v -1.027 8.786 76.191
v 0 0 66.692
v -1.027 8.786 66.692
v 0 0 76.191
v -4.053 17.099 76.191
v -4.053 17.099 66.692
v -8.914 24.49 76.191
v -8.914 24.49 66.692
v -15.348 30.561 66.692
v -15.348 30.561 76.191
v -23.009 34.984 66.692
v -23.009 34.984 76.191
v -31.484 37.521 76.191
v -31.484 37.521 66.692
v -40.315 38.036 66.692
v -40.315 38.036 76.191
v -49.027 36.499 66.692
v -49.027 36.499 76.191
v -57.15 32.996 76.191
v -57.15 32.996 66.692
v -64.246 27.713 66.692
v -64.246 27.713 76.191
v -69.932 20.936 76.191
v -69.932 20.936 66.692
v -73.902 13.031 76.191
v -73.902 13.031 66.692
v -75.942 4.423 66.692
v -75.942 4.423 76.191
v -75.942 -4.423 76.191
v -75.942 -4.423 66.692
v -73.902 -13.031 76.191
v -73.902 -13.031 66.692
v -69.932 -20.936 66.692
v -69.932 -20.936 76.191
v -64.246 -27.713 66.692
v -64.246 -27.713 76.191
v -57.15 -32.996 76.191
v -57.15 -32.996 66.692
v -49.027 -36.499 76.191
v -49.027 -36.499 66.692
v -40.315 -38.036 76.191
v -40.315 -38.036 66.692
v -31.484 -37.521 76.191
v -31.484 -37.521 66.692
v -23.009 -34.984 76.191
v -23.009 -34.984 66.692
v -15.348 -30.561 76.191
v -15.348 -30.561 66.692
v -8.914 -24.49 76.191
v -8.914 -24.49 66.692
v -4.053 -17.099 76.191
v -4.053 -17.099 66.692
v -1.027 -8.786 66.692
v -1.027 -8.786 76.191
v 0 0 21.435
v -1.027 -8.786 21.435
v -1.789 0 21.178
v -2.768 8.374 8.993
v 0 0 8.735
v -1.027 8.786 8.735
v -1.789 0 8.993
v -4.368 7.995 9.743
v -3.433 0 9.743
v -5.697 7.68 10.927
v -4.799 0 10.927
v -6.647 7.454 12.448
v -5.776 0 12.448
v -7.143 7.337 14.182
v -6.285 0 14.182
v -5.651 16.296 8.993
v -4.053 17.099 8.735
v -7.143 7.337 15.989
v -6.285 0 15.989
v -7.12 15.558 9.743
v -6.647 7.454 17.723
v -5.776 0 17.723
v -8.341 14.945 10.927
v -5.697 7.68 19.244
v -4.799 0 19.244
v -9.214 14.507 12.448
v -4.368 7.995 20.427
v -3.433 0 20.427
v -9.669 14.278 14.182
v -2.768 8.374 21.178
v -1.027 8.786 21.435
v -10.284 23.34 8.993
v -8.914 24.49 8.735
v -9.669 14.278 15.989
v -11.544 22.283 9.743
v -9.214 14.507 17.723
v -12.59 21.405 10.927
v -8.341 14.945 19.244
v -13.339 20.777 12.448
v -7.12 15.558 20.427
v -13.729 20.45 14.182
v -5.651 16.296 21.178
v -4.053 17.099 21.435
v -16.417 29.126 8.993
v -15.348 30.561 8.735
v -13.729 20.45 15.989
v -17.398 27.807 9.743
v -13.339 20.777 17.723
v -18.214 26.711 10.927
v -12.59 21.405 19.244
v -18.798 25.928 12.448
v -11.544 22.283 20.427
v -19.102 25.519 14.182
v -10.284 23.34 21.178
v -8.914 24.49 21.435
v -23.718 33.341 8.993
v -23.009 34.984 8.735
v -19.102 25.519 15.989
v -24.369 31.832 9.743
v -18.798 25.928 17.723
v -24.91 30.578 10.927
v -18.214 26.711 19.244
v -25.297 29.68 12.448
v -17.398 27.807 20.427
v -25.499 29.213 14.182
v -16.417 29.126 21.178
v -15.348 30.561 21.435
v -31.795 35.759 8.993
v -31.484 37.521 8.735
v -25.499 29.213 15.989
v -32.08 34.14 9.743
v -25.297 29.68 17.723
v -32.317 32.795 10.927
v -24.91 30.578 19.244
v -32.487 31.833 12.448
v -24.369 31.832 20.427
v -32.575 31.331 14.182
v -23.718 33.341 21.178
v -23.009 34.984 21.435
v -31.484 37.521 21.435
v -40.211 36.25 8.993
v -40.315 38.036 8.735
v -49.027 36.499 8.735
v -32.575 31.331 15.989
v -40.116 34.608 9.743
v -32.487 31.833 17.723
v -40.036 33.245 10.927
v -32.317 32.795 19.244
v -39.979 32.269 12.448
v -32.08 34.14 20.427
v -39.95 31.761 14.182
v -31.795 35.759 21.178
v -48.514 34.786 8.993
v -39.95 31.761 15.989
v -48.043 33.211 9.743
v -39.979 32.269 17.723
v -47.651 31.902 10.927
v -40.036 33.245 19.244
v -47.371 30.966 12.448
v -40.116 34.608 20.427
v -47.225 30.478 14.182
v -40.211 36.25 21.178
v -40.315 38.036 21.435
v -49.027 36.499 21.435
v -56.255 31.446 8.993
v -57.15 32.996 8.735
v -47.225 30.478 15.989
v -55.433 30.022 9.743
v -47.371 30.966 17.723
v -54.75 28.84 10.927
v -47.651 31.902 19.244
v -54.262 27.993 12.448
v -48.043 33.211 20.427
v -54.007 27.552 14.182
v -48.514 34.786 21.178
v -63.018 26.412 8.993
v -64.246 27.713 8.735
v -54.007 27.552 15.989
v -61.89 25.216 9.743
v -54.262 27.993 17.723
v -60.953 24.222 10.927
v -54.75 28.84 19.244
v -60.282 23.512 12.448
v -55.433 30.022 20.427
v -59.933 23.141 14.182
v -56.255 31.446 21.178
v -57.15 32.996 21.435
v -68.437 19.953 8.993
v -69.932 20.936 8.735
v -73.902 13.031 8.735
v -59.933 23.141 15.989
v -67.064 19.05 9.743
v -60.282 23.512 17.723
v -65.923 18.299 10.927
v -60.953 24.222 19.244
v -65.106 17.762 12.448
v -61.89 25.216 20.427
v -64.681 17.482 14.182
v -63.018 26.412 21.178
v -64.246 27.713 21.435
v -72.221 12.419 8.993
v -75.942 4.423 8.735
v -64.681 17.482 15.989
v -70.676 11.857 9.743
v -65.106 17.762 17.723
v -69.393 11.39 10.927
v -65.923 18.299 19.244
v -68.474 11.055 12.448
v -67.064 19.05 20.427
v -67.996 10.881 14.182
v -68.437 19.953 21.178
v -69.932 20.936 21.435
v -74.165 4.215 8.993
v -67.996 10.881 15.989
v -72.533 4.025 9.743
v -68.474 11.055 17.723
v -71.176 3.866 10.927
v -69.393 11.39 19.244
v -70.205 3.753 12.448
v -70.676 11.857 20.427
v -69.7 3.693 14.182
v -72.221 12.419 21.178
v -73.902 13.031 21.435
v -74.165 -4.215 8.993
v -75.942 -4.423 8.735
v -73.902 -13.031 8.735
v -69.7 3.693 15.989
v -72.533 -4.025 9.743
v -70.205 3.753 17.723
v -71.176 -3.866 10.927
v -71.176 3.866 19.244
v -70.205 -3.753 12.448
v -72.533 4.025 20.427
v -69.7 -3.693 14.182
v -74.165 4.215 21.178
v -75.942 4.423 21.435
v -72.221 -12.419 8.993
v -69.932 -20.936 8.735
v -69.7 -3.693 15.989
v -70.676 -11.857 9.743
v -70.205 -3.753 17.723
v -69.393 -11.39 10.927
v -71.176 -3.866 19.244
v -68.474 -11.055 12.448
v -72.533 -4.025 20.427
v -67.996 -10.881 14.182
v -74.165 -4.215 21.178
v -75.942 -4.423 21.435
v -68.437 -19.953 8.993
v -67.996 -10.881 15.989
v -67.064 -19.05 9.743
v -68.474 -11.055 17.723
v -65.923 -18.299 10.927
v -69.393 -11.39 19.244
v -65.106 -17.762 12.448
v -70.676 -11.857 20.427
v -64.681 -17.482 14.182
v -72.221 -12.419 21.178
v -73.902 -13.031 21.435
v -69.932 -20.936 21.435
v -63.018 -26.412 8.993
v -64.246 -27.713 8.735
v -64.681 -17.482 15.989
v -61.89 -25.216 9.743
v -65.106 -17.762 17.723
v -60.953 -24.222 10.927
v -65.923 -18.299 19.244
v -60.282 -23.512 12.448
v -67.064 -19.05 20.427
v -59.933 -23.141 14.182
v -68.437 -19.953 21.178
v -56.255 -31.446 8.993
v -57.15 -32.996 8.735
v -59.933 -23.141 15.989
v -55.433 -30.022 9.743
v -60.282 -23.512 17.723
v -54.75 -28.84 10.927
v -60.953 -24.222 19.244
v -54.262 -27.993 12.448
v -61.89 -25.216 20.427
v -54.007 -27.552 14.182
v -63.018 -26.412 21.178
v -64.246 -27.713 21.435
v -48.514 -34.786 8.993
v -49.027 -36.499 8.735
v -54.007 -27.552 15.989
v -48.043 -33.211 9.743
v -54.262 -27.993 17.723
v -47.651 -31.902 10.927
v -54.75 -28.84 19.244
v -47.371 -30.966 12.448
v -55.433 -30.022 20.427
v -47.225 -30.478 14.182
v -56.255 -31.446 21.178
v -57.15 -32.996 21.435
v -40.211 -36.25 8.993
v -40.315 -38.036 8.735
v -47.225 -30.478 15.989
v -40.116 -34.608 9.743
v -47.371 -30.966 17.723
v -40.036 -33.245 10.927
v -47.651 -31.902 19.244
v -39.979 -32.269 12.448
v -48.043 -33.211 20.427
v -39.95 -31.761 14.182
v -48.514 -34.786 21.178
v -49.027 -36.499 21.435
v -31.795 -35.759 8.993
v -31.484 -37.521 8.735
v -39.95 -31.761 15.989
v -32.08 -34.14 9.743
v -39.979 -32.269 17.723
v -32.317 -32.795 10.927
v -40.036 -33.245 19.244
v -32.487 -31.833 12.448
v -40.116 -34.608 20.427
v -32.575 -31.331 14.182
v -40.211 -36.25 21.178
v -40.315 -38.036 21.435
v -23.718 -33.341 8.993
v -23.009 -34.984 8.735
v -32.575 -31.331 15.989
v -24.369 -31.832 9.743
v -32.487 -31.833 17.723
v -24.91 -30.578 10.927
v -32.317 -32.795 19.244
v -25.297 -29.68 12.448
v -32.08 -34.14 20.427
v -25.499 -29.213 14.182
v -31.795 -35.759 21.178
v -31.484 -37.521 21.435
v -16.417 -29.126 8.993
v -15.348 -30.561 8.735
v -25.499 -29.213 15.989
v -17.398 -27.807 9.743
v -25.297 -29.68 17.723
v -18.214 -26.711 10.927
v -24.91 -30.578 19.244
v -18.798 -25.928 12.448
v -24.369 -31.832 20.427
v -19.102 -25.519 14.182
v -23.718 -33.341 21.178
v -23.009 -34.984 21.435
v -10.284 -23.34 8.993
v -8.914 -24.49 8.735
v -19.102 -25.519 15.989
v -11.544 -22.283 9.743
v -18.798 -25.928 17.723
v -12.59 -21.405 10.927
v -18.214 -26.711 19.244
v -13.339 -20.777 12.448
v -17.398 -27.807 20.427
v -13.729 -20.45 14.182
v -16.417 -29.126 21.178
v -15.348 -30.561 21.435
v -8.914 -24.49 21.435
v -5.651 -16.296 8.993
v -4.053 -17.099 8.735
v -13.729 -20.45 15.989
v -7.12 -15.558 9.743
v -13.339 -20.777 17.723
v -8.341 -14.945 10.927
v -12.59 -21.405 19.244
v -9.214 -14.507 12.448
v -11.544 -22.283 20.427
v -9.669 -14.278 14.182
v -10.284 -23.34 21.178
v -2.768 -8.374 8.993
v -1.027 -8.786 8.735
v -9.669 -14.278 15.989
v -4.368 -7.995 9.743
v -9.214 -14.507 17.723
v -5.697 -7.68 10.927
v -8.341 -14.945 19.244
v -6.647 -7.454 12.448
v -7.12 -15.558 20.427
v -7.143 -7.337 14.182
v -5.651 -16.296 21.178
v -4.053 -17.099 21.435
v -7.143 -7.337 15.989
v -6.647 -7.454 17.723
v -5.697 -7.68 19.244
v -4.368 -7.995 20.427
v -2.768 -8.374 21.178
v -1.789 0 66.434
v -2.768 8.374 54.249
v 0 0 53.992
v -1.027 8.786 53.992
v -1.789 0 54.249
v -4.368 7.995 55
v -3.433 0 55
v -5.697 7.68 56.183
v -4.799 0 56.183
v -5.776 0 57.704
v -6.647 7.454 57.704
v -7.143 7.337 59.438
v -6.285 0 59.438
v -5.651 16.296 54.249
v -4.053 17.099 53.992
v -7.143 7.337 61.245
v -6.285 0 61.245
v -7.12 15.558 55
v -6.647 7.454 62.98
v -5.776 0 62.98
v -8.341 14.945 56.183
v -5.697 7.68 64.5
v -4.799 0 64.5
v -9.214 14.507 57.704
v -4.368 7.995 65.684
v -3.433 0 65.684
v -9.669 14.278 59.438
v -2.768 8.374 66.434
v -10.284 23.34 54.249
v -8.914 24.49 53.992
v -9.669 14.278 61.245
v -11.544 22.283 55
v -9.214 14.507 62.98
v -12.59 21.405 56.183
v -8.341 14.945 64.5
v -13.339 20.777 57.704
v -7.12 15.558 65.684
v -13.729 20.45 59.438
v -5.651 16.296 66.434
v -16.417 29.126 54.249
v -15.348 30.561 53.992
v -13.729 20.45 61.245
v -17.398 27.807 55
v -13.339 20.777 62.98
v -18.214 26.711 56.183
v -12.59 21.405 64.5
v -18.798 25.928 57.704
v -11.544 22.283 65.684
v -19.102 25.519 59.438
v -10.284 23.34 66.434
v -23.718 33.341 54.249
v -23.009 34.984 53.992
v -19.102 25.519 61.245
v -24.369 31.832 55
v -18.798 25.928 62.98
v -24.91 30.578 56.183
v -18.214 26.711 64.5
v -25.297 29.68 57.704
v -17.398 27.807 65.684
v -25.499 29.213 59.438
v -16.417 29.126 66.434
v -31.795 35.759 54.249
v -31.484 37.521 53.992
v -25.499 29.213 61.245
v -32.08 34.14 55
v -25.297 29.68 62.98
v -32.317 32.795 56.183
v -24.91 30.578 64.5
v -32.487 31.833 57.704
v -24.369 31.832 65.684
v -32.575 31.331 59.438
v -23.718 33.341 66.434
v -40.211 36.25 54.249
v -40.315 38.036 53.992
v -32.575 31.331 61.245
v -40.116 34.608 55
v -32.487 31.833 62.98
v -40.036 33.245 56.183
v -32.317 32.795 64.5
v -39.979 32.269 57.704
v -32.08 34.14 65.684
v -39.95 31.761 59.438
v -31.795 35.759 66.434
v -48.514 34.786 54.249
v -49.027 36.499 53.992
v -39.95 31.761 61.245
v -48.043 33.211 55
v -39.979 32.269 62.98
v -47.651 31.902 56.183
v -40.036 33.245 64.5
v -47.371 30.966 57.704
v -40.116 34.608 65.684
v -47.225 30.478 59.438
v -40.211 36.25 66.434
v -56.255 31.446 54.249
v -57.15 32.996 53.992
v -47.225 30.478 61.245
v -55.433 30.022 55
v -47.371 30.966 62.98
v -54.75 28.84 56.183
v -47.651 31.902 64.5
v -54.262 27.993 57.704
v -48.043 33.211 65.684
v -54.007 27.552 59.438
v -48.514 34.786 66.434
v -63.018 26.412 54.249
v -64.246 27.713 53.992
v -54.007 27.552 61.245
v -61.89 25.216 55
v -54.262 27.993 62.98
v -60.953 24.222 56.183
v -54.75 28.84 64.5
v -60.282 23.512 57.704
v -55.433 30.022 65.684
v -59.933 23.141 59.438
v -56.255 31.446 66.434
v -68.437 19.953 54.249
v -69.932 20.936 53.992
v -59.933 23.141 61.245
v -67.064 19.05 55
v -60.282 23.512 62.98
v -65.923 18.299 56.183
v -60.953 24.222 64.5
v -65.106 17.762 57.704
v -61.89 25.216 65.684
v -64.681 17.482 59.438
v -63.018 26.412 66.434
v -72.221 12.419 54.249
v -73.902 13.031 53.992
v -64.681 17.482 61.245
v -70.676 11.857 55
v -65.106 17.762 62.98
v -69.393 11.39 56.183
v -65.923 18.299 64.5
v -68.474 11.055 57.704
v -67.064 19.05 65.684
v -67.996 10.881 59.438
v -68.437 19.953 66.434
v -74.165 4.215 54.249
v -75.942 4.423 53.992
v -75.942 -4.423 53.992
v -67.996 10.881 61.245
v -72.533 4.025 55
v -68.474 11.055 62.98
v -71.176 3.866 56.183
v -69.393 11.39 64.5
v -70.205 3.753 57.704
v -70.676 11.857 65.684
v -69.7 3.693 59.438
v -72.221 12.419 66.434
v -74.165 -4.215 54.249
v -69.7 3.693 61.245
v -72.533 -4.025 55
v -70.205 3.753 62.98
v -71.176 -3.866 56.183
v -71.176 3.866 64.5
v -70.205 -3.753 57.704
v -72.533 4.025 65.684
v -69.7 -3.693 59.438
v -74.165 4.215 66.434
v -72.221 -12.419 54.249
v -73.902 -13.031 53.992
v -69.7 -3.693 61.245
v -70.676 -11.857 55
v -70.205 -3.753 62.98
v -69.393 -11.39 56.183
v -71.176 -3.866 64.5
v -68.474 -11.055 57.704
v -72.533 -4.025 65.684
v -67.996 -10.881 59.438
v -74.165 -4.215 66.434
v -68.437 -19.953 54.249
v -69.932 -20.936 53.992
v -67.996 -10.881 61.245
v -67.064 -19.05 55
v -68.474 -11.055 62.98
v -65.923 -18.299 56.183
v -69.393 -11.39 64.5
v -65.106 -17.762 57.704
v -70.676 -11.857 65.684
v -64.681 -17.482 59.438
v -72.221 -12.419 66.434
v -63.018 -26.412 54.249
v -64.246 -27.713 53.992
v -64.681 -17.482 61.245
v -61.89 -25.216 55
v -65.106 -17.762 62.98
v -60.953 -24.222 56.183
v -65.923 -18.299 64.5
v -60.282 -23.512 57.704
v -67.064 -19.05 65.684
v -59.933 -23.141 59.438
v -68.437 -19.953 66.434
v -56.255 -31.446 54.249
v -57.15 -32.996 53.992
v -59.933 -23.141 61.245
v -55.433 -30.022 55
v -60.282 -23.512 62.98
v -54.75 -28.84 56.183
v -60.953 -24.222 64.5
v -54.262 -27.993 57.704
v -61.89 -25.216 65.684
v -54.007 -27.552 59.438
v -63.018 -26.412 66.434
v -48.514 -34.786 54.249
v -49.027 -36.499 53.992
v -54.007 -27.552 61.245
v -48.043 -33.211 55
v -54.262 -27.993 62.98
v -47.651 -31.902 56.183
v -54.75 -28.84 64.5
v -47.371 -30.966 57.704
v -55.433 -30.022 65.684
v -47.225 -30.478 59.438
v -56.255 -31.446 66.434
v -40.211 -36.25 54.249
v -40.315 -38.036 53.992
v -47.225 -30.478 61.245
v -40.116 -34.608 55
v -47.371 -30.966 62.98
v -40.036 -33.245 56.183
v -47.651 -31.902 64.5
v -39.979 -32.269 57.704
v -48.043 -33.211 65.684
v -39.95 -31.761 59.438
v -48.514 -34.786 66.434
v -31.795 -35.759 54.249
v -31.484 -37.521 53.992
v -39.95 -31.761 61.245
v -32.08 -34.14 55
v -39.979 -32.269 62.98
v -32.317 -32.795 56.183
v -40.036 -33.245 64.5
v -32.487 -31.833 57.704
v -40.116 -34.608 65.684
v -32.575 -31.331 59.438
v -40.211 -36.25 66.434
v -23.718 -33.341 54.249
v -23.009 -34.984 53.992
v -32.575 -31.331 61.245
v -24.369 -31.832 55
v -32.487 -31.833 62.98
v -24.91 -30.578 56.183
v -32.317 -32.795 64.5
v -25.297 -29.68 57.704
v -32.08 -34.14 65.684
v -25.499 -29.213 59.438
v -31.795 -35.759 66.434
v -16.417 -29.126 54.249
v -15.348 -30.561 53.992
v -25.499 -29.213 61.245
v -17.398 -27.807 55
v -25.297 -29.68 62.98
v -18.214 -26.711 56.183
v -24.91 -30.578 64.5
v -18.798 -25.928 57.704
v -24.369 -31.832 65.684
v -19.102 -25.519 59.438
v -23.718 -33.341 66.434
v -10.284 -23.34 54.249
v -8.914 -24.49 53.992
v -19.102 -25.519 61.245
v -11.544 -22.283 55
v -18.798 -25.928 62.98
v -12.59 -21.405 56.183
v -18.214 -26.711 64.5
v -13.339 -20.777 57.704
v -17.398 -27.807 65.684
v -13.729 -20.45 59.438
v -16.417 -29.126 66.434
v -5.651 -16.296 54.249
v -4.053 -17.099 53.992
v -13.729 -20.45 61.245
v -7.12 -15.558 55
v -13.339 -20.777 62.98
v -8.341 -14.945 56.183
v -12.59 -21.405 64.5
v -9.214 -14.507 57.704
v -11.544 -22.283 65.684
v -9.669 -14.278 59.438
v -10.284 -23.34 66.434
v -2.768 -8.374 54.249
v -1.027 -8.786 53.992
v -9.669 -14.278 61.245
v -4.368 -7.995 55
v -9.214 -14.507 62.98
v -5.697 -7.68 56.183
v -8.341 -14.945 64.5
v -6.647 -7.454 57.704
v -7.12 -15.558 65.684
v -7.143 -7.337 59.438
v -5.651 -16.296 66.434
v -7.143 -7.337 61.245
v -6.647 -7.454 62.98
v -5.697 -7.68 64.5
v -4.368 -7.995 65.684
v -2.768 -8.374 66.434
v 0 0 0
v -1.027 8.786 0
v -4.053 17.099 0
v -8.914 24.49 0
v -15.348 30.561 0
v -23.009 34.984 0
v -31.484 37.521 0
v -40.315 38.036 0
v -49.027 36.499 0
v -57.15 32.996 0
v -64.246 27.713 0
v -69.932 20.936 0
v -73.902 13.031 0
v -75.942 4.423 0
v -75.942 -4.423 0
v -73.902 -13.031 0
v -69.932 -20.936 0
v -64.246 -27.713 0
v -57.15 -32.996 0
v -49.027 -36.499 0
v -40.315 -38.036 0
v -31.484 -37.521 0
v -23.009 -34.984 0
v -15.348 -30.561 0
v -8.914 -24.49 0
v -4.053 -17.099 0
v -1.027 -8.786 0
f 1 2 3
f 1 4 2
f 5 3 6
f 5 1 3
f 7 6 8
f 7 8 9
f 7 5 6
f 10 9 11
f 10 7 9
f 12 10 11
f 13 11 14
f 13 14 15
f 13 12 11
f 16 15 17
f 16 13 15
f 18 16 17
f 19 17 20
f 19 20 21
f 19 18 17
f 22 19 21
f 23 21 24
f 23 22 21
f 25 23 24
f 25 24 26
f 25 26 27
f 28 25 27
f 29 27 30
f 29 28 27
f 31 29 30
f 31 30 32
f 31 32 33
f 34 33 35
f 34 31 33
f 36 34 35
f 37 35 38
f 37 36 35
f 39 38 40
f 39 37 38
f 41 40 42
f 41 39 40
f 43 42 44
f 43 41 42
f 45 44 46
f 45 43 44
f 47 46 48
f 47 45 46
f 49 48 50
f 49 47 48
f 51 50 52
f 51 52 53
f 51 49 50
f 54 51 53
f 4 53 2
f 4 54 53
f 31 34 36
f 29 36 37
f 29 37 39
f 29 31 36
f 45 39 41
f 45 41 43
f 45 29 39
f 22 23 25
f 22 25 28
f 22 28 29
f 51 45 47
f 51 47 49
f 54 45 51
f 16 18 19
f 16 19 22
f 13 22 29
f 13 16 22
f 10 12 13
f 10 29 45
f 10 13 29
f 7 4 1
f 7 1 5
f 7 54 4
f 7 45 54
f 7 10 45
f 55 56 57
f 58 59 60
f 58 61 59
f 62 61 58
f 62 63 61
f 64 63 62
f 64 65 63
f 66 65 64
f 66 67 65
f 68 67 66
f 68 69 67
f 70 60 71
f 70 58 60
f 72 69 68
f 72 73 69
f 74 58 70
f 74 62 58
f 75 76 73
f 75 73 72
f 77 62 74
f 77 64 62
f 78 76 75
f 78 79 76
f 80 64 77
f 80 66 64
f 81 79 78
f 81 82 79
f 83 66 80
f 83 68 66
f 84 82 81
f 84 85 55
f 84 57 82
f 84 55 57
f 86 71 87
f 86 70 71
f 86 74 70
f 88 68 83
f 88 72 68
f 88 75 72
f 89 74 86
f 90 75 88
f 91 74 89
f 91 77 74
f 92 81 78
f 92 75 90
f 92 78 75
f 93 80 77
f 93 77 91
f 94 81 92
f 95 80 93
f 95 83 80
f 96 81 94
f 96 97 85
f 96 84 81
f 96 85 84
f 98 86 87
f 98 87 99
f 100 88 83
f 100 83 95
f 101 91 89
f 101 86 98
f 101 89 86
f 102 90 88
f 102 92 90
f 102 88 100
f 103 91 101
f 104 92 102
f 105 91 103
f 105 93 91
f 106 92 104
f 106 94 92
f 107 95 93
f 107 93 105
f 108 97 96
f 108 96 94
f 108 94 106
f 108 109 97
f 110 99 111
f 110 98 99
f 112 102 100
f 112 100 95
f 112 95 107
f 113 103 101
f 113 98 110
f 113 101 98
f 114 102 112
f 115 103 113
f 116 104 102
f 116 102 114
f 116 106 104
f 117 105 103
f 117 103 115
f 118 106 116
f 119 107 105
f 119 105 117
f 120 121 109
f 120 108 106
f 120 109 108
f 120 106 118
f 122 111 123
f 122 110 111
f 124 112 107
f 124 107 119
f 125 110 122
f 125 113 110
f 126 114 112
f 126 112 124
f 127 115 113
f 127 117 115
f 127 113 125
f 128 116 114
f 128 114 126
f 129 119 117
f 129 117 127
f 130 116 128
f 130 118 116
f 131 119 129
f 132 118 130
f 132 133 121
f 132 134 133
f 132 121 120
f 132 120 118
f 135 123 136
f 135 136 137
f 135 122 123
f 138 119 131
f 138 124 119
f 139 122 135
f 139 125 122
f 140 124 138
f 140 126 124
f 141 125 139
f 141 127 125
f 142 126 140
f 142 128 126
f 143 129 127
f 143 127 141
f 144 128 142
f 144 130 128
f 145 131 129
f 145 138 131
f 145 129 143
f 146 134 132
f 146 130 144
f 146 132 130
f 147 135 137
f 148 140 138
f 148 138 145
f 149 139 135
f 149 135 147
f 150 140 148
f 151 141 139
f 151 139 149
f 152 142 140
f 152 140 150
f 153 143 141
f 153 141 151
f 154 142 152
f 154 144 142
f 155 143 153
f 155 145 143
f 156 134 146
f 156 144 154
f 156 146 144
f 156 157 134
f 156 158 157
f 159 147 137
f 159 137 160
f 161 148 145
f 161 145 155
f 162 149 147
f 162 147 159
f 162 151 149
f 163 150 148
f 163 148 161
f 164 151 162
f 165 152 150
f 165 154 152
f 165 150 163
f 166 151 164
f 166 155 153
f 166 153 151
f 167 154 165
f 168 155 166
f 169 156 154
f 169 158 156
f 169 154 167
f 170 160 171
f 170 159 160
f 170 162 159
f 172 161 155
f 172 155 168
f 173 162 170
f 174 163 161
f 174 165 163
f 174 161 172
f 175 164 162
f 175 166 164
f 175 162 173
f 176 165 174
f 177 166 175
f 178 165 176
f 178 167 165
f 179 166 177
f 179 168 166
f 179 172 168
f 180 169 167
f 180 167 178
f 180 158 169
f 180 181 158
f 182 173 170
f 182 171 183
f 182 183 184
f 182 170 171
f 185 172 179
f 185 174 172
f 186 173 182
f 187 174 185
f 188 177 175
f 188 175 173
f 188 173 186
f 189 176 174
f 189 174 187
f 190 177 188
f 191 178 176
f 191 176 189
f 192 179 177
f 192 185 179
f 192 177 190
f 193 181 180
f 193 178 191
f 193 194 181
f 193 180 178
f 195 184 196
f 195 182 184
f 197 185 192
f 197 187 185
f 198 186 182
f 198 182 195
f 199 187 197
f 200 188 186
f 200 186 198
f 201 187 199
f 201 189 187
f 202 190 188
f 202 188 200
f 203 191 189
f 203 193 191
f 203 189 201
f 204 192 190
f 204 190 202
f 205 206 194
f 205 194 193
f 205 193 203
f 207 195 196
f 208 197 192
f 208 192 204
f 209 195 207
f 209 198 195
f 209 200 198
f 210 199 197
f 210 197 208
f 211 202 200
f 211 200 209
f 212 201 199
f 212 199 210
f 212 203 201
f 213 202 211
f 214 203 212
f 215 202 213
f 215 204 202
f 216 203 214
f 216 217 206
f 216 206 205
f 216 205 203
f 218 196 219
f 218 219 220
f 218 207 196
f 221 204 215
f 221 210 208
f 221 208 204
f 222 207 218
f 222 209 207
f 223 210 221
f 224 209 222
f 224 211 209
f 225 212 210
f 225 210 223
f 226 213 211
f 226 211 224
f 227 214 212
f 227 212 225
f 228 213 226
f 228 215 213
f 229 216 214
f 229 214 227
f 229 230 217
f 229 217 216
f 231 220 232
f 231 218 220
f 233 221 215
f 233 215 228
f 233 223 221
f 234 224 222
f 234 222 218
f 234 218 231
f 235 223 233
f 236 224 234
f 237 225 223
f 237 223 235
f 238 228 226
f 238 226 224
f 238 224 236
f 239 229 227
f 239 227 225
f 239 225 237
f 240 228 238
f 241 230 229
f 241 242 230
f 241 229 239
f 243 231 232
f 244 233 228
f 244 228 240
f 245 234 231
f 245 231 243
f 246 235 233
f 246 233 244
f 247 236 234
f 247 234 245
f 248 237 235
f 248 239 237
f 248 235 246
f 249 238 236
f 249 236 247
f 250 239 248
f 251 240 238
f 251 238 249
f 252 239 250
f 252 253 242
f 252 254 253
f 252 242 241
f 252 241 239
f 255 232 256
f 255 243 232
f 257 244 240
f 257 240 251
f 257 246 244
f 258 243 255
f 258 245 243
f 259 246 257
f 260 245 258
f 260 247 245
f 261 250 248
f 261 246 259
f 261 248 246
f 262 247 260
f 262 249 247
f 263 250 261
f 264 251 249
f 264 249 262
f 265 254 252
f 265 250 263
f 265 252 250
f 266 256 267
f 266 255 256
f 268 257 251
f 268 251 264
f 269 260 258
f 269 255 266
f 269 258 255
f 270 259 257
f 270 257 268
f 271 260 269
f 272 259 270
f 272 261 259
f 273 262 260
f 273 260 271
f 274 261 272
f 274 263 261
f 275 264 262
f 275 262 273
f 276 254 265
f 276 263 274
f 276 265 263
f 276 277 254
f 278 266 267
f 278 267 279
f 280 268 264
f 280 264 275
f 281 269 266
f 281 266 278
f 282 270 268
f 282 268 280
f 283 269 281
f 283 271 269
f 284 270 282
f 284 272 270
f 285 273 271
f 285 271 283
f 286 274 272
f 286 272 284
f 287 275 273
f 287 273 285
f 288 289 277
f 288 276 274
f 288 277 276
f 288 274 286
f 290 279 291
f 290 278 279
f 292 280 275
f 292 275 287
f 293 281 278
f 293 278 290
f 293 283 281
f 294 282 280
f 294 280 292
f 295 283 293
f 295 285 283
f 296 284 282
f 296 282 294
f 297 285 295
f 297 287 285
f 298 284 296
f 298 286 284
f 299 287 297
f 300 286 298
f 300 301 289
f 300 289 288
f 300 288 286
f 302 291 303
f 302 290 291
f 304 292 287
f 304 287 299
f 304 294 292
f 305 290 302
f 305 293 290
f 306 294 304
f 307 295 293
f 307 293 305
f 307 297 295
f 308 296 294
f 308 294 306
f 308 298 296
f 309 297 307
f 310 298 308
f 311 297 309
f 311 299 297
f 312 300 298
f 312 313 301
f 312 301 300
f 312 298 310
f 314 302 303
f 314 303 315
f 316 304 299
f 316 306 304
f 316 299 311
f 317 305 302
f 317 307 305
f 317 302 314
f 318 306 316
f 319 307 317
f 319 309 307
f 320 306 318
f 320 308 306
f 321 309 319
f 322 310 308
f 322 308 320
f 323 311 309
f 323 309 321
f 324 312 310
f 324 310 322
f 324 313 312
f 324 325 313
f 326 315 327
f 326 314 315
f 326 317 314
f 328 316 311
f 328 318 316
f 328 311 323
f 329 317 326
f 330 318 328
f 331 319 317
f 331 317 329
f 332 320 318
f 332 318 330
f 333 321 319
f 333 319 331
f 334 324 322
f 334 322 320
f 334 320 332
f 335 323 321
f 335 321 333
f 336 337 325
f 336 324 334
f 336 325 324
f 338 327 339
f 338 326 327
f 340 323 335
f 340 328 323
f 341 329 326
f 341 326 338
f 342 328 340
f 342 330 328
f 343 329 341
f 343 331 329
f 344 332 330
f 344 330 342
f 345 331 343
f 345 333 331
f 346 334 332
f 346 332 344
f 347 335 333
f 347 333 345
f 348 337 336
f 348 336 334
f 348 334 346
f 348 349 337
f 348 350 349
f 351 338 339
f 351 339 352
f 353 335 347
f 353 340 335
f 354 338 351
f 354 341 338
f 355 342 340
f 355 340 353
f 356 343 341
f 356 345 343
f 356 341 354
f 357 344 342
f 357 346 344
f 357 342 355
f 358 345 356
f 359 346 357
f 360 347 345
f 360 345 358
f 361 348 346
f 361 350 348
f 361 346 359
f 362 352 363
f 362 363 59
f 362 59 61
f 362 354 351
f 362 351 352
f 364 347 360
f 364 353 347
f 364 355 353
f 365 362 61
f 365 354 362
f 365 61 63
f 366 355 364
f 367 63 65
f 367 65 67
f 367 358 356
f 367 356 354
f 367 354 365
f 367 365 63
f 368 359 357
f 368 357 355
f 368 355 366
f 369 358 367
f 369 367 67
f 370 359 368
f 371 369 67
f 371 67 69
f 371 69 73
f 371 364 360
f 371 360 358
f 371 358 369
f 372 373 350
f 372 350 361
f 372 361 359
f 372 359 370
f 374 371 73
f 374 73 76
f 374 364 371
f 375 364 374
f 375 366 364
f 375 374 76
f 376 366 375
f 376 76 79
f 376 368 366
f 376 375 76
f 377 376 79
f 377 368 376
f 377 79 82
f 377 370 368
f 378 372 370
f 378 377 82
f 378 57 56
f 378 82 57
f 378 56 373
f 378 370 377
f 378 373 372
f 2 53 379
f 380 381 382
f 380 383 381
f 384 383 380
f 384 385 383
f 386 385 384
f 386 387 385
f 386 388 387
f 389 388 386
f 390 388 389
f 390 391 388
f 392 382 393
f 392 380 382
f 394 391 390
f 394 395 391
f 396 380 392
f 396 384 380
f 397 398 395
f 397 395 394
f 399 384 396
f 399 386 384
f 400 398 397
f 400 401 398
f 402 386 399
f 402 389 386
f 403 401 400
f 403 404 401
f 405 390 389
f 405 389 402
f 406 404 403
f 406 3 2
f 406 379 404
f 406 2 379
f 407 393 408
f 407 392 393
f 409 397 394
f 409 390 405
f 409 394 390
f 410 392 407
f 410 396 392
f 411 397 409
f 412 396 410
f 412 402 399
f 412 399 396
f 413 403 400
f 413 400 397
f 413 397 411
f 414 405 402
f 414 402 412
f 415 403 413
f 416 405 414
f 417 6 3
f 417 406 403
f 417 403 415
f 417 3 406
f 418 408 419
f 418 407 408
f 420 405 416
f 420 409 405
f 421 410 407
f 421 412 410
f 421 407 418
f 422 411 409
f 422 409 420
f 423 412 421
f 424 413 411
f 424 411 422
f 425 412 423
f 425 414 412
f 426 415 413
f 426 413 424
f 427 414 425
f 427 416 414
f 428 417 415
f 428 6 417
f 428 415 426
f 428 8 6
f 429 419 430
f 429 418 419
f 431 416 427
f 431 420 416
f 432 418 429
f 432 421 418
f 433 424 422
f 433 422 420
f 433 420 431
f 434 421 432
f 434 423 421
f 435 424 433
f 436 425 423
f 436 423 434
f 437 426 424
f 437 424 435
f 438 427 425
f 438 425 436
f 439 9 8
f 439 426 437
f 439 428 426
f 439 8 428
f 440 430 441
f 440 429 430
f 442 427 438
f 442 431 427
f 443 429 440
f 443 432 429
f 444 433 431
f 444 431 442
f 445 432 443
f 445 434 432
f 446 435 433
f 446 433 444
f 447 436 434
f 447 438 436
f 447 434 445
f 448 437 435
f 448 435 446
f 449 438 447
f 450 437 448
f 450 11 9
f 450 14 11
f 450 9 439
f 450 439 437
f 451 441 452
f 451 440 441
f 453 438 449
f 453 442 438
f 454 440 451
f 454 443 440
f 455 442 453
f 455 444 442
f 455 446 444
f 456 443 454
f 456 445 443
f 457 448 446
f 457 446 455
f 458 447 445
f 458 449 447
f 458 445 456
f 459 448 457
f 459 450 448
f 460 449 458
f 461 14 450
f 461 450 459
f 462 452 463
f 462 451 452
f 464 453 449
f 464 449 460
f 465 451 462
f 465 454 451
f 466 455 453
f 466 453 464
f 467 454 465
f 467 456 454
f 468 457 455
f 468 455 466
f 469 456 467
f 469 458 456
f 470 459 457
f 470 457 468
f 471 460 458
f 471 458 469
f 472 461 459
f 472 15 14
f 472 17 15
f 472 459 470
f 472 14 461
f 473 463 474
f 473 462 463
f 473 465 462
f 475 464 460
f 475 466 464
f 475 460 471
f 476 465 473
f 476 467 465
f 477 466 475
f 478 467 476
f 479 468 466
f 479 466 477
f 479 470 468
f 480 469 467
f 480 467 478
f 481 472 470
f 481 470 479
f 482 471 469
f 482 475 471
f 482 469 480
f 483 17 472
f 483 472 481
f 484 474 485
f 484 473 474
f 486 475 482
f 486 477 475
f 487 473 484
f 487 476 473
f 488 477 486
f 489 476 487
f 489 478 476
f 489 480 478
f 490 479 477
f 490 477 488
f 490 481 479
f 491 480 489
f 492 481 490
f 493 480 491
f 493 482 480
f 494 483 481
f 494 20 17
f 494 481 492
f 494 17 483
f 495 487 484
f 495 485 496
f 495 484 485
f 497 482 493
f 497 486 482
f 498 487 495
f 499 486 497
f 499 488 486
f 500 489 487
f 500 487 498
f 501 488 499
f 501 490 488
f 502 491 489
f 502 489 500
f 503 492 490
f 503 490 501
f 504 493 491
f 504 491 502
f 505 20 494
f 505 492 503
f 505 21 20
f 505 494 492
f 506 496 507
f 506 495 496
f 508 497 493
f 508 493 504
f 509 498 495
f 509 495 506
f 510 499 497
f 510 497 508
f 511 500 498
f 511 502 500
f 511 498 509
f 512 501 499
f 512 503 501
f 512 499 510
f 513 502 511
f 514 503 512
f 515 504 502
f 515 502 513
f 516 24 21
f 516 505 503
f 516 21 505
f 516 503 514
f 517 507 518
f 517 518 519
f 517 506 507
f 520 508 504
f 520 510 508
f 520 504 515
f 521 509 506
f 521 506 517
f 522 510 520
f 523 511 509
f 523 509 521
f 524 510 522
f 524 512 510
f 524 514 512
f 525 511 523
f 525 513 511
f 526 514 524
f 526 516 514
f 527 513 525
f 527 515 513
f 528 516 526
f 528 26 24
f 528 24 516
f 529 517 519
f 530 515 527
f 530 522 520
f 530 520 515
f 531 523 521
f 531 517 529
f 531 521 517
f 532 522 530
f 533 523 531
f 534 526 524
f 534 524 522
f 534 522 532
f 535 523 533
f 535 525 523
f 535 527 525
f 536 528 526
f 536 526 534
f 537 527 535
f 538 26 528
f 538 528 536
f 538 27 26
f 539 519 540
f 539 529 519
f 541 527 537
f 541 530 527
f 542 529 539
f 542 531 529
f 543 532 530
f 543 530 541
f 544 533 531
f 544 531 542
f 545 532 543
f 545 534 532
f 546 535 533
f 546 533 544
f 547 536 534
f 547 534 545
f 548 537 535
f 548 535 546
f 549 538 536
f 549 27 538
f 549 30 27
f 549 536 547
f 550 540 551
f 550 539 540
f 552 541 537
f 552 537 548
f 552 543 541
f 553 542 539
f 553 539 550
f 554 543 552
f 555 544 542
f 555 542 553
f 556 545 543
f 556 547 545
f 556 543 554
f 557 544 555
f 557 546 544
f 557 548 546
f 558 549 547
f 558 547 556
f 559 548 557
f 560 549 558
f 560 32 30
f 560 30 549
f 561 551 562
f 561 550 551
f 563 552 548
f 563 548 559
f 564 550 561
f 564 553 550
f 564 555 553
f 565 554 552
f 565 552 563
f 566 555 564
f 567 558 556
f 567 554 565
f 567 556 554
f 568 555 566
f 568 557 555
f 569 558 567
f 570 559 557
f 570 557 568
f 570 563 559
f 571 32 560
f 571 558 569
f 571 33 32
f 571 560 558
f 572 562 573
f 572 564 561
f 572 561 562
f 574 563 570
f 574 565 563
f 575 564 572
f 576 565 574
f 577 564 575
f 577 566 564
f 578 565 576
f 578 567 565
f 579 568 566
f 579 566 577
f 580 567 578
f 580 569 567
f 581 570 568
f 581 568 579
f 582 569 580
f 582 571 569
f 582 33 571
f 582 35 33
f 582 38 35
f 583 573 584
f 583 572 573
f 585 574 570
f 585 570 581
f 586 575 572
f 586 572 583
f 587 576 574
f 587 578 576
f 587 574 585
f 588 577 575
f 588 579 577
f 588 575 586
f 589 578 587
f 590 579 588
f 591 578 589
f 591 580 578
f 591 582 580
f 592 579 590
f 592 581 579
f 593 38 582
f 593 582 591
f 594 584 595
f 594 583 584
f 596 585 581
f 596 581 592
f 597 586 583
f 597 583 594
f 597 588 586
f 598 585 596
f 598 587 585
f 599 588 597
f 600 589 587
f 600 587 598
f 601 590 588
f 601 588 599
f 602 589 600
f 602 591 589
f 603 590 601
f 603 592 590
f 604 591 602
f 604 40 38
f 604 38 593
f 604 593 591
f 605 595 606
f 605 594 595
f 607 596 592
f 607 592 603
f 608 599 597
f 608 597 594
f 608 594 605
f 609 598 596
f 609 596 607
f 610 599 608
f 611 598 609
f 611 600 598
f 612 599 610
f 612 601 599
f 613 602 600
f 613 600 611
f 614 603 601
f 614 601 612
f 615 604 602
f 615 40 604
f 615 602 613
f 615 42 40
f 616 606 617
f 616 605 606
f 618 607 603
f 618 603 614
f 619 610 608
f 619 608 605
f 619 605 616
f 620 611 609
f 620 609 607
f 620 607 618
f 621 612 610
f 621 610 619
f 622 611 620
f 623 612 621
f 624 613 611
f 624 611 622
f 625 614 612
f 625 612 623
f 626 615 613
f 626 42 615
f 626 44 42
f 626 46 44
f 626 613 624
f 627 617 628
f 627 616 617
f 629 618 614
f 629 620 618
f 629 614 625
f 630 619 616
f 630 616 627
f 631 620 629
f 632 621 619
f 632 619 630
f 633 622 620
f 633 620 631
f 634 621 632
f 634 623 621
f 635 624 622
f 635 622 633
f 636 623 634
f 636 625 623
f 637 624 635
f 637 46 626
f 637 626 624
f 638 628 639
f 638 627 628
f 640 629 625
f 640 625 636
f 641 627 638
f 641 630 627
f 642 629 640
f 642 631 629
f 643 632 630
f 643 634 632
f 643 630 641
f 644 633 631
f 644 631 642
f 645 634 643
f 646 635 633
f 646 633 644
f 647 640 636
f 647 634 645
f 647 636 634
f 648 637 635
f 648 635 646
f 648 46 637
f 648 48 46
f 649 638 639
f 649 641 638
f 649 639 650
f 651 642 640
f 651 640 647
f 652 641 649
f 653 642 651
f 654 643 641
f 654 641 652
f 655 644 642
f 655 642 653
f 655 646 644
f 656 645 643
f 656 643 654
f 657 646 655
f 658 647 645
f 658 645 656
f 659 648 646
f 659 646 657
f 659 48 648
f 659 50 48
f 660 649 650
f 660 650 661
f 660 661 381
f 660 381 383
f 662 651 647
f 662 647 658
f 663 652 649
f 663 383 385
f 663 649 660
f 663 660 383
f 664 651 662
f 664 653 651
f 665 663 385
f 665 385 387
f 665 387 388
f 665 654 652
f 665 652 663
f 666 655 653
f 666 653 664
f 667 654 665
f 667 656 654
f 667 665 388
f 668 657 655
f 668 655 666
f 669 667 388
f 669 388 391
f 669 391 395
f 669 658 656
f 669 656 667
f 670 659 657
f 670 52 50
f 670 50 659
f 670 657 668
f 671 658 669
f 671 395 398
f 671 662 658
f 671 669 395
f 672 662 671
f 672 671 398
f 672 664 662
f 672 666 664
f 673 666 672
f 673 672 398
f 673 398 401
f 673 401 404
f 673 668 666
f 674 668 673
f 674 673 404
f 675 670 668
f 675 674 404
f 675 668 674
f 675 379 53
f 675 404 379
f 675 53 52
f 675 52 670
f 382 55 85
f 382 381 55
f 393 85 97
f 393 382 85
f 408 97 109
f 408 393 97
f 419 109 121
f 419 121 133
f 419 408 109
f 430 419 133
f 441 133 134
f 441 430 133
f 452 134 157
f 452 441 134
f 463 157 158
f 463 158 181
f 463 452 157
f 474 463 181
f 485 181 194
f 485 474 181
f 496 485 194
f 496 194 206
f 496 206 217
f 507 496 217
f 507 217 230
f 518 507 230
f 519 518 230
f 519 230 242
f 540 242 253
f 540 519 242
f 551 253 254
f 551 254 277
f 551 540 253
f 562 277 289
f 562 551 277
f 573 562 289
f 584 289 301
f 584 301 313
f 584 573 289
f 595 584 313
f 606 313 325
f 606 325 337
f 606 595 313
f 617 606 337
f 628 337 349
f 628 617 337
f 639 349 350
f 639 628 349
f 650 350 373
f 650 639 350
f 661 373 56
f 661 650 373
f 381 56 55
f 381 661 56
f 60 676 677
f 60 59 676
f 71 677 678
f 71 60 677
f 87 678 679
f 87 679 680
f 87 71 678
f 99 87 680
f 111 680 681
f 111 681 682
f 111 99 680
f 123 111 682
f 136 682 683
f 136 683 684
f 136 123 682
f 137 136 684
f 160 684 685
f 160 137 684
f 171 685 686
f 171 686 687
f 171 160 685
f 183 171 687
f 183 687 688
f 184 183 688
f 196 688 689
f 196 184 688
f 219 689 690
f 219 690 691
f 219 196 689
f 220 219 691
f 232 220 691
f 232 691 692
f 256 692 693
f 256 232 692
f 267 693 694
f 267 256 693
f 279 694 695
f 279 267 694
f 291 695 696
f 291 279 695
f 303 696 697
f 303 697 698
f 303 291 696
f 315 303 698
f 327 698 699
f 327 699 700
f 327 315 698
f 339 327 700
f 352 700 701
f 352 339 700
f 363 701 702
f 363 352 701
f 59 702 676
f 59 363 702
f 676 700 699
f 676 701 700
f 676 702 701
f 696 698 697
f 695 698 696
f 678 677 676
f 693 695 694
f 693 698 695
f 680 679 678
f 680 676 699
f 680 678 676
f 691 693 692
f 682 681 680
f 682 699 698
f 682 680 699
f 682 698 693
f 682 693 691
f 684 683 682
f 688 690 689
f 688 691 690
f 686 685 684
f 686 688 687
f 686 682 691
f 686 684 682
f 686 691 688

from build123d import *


with BuildPart() as f1:
    # F0 (on Front) → F1 (revolve)
    with BuildSketch(Plane.XZ):
        with BuildLine():
            Line((-38.1, 0), (0, 0))
            Line((0, 0), (0, 8.735418))
            ThreePointArc((0, 8.735418), (-6.35, 15.085418), (0, 21.435418))
            Line((0, 21.435418), (0, 53.991671))
            ThreePointArc((0, 53.991671), (-6.35, 60.341671), (0, 66.691671))
            Line((0, 66.691671), (0, 76.190904))
            Line((0, 76.190904), (-38.1, 76.190904))
            Line((-38.1, 76.190904), (-38.1, 0))
        make_face()
    revolve(axis=Axis((-38.1, 0, 38.095452), (0, 0, 1)))


solid = f1.part
